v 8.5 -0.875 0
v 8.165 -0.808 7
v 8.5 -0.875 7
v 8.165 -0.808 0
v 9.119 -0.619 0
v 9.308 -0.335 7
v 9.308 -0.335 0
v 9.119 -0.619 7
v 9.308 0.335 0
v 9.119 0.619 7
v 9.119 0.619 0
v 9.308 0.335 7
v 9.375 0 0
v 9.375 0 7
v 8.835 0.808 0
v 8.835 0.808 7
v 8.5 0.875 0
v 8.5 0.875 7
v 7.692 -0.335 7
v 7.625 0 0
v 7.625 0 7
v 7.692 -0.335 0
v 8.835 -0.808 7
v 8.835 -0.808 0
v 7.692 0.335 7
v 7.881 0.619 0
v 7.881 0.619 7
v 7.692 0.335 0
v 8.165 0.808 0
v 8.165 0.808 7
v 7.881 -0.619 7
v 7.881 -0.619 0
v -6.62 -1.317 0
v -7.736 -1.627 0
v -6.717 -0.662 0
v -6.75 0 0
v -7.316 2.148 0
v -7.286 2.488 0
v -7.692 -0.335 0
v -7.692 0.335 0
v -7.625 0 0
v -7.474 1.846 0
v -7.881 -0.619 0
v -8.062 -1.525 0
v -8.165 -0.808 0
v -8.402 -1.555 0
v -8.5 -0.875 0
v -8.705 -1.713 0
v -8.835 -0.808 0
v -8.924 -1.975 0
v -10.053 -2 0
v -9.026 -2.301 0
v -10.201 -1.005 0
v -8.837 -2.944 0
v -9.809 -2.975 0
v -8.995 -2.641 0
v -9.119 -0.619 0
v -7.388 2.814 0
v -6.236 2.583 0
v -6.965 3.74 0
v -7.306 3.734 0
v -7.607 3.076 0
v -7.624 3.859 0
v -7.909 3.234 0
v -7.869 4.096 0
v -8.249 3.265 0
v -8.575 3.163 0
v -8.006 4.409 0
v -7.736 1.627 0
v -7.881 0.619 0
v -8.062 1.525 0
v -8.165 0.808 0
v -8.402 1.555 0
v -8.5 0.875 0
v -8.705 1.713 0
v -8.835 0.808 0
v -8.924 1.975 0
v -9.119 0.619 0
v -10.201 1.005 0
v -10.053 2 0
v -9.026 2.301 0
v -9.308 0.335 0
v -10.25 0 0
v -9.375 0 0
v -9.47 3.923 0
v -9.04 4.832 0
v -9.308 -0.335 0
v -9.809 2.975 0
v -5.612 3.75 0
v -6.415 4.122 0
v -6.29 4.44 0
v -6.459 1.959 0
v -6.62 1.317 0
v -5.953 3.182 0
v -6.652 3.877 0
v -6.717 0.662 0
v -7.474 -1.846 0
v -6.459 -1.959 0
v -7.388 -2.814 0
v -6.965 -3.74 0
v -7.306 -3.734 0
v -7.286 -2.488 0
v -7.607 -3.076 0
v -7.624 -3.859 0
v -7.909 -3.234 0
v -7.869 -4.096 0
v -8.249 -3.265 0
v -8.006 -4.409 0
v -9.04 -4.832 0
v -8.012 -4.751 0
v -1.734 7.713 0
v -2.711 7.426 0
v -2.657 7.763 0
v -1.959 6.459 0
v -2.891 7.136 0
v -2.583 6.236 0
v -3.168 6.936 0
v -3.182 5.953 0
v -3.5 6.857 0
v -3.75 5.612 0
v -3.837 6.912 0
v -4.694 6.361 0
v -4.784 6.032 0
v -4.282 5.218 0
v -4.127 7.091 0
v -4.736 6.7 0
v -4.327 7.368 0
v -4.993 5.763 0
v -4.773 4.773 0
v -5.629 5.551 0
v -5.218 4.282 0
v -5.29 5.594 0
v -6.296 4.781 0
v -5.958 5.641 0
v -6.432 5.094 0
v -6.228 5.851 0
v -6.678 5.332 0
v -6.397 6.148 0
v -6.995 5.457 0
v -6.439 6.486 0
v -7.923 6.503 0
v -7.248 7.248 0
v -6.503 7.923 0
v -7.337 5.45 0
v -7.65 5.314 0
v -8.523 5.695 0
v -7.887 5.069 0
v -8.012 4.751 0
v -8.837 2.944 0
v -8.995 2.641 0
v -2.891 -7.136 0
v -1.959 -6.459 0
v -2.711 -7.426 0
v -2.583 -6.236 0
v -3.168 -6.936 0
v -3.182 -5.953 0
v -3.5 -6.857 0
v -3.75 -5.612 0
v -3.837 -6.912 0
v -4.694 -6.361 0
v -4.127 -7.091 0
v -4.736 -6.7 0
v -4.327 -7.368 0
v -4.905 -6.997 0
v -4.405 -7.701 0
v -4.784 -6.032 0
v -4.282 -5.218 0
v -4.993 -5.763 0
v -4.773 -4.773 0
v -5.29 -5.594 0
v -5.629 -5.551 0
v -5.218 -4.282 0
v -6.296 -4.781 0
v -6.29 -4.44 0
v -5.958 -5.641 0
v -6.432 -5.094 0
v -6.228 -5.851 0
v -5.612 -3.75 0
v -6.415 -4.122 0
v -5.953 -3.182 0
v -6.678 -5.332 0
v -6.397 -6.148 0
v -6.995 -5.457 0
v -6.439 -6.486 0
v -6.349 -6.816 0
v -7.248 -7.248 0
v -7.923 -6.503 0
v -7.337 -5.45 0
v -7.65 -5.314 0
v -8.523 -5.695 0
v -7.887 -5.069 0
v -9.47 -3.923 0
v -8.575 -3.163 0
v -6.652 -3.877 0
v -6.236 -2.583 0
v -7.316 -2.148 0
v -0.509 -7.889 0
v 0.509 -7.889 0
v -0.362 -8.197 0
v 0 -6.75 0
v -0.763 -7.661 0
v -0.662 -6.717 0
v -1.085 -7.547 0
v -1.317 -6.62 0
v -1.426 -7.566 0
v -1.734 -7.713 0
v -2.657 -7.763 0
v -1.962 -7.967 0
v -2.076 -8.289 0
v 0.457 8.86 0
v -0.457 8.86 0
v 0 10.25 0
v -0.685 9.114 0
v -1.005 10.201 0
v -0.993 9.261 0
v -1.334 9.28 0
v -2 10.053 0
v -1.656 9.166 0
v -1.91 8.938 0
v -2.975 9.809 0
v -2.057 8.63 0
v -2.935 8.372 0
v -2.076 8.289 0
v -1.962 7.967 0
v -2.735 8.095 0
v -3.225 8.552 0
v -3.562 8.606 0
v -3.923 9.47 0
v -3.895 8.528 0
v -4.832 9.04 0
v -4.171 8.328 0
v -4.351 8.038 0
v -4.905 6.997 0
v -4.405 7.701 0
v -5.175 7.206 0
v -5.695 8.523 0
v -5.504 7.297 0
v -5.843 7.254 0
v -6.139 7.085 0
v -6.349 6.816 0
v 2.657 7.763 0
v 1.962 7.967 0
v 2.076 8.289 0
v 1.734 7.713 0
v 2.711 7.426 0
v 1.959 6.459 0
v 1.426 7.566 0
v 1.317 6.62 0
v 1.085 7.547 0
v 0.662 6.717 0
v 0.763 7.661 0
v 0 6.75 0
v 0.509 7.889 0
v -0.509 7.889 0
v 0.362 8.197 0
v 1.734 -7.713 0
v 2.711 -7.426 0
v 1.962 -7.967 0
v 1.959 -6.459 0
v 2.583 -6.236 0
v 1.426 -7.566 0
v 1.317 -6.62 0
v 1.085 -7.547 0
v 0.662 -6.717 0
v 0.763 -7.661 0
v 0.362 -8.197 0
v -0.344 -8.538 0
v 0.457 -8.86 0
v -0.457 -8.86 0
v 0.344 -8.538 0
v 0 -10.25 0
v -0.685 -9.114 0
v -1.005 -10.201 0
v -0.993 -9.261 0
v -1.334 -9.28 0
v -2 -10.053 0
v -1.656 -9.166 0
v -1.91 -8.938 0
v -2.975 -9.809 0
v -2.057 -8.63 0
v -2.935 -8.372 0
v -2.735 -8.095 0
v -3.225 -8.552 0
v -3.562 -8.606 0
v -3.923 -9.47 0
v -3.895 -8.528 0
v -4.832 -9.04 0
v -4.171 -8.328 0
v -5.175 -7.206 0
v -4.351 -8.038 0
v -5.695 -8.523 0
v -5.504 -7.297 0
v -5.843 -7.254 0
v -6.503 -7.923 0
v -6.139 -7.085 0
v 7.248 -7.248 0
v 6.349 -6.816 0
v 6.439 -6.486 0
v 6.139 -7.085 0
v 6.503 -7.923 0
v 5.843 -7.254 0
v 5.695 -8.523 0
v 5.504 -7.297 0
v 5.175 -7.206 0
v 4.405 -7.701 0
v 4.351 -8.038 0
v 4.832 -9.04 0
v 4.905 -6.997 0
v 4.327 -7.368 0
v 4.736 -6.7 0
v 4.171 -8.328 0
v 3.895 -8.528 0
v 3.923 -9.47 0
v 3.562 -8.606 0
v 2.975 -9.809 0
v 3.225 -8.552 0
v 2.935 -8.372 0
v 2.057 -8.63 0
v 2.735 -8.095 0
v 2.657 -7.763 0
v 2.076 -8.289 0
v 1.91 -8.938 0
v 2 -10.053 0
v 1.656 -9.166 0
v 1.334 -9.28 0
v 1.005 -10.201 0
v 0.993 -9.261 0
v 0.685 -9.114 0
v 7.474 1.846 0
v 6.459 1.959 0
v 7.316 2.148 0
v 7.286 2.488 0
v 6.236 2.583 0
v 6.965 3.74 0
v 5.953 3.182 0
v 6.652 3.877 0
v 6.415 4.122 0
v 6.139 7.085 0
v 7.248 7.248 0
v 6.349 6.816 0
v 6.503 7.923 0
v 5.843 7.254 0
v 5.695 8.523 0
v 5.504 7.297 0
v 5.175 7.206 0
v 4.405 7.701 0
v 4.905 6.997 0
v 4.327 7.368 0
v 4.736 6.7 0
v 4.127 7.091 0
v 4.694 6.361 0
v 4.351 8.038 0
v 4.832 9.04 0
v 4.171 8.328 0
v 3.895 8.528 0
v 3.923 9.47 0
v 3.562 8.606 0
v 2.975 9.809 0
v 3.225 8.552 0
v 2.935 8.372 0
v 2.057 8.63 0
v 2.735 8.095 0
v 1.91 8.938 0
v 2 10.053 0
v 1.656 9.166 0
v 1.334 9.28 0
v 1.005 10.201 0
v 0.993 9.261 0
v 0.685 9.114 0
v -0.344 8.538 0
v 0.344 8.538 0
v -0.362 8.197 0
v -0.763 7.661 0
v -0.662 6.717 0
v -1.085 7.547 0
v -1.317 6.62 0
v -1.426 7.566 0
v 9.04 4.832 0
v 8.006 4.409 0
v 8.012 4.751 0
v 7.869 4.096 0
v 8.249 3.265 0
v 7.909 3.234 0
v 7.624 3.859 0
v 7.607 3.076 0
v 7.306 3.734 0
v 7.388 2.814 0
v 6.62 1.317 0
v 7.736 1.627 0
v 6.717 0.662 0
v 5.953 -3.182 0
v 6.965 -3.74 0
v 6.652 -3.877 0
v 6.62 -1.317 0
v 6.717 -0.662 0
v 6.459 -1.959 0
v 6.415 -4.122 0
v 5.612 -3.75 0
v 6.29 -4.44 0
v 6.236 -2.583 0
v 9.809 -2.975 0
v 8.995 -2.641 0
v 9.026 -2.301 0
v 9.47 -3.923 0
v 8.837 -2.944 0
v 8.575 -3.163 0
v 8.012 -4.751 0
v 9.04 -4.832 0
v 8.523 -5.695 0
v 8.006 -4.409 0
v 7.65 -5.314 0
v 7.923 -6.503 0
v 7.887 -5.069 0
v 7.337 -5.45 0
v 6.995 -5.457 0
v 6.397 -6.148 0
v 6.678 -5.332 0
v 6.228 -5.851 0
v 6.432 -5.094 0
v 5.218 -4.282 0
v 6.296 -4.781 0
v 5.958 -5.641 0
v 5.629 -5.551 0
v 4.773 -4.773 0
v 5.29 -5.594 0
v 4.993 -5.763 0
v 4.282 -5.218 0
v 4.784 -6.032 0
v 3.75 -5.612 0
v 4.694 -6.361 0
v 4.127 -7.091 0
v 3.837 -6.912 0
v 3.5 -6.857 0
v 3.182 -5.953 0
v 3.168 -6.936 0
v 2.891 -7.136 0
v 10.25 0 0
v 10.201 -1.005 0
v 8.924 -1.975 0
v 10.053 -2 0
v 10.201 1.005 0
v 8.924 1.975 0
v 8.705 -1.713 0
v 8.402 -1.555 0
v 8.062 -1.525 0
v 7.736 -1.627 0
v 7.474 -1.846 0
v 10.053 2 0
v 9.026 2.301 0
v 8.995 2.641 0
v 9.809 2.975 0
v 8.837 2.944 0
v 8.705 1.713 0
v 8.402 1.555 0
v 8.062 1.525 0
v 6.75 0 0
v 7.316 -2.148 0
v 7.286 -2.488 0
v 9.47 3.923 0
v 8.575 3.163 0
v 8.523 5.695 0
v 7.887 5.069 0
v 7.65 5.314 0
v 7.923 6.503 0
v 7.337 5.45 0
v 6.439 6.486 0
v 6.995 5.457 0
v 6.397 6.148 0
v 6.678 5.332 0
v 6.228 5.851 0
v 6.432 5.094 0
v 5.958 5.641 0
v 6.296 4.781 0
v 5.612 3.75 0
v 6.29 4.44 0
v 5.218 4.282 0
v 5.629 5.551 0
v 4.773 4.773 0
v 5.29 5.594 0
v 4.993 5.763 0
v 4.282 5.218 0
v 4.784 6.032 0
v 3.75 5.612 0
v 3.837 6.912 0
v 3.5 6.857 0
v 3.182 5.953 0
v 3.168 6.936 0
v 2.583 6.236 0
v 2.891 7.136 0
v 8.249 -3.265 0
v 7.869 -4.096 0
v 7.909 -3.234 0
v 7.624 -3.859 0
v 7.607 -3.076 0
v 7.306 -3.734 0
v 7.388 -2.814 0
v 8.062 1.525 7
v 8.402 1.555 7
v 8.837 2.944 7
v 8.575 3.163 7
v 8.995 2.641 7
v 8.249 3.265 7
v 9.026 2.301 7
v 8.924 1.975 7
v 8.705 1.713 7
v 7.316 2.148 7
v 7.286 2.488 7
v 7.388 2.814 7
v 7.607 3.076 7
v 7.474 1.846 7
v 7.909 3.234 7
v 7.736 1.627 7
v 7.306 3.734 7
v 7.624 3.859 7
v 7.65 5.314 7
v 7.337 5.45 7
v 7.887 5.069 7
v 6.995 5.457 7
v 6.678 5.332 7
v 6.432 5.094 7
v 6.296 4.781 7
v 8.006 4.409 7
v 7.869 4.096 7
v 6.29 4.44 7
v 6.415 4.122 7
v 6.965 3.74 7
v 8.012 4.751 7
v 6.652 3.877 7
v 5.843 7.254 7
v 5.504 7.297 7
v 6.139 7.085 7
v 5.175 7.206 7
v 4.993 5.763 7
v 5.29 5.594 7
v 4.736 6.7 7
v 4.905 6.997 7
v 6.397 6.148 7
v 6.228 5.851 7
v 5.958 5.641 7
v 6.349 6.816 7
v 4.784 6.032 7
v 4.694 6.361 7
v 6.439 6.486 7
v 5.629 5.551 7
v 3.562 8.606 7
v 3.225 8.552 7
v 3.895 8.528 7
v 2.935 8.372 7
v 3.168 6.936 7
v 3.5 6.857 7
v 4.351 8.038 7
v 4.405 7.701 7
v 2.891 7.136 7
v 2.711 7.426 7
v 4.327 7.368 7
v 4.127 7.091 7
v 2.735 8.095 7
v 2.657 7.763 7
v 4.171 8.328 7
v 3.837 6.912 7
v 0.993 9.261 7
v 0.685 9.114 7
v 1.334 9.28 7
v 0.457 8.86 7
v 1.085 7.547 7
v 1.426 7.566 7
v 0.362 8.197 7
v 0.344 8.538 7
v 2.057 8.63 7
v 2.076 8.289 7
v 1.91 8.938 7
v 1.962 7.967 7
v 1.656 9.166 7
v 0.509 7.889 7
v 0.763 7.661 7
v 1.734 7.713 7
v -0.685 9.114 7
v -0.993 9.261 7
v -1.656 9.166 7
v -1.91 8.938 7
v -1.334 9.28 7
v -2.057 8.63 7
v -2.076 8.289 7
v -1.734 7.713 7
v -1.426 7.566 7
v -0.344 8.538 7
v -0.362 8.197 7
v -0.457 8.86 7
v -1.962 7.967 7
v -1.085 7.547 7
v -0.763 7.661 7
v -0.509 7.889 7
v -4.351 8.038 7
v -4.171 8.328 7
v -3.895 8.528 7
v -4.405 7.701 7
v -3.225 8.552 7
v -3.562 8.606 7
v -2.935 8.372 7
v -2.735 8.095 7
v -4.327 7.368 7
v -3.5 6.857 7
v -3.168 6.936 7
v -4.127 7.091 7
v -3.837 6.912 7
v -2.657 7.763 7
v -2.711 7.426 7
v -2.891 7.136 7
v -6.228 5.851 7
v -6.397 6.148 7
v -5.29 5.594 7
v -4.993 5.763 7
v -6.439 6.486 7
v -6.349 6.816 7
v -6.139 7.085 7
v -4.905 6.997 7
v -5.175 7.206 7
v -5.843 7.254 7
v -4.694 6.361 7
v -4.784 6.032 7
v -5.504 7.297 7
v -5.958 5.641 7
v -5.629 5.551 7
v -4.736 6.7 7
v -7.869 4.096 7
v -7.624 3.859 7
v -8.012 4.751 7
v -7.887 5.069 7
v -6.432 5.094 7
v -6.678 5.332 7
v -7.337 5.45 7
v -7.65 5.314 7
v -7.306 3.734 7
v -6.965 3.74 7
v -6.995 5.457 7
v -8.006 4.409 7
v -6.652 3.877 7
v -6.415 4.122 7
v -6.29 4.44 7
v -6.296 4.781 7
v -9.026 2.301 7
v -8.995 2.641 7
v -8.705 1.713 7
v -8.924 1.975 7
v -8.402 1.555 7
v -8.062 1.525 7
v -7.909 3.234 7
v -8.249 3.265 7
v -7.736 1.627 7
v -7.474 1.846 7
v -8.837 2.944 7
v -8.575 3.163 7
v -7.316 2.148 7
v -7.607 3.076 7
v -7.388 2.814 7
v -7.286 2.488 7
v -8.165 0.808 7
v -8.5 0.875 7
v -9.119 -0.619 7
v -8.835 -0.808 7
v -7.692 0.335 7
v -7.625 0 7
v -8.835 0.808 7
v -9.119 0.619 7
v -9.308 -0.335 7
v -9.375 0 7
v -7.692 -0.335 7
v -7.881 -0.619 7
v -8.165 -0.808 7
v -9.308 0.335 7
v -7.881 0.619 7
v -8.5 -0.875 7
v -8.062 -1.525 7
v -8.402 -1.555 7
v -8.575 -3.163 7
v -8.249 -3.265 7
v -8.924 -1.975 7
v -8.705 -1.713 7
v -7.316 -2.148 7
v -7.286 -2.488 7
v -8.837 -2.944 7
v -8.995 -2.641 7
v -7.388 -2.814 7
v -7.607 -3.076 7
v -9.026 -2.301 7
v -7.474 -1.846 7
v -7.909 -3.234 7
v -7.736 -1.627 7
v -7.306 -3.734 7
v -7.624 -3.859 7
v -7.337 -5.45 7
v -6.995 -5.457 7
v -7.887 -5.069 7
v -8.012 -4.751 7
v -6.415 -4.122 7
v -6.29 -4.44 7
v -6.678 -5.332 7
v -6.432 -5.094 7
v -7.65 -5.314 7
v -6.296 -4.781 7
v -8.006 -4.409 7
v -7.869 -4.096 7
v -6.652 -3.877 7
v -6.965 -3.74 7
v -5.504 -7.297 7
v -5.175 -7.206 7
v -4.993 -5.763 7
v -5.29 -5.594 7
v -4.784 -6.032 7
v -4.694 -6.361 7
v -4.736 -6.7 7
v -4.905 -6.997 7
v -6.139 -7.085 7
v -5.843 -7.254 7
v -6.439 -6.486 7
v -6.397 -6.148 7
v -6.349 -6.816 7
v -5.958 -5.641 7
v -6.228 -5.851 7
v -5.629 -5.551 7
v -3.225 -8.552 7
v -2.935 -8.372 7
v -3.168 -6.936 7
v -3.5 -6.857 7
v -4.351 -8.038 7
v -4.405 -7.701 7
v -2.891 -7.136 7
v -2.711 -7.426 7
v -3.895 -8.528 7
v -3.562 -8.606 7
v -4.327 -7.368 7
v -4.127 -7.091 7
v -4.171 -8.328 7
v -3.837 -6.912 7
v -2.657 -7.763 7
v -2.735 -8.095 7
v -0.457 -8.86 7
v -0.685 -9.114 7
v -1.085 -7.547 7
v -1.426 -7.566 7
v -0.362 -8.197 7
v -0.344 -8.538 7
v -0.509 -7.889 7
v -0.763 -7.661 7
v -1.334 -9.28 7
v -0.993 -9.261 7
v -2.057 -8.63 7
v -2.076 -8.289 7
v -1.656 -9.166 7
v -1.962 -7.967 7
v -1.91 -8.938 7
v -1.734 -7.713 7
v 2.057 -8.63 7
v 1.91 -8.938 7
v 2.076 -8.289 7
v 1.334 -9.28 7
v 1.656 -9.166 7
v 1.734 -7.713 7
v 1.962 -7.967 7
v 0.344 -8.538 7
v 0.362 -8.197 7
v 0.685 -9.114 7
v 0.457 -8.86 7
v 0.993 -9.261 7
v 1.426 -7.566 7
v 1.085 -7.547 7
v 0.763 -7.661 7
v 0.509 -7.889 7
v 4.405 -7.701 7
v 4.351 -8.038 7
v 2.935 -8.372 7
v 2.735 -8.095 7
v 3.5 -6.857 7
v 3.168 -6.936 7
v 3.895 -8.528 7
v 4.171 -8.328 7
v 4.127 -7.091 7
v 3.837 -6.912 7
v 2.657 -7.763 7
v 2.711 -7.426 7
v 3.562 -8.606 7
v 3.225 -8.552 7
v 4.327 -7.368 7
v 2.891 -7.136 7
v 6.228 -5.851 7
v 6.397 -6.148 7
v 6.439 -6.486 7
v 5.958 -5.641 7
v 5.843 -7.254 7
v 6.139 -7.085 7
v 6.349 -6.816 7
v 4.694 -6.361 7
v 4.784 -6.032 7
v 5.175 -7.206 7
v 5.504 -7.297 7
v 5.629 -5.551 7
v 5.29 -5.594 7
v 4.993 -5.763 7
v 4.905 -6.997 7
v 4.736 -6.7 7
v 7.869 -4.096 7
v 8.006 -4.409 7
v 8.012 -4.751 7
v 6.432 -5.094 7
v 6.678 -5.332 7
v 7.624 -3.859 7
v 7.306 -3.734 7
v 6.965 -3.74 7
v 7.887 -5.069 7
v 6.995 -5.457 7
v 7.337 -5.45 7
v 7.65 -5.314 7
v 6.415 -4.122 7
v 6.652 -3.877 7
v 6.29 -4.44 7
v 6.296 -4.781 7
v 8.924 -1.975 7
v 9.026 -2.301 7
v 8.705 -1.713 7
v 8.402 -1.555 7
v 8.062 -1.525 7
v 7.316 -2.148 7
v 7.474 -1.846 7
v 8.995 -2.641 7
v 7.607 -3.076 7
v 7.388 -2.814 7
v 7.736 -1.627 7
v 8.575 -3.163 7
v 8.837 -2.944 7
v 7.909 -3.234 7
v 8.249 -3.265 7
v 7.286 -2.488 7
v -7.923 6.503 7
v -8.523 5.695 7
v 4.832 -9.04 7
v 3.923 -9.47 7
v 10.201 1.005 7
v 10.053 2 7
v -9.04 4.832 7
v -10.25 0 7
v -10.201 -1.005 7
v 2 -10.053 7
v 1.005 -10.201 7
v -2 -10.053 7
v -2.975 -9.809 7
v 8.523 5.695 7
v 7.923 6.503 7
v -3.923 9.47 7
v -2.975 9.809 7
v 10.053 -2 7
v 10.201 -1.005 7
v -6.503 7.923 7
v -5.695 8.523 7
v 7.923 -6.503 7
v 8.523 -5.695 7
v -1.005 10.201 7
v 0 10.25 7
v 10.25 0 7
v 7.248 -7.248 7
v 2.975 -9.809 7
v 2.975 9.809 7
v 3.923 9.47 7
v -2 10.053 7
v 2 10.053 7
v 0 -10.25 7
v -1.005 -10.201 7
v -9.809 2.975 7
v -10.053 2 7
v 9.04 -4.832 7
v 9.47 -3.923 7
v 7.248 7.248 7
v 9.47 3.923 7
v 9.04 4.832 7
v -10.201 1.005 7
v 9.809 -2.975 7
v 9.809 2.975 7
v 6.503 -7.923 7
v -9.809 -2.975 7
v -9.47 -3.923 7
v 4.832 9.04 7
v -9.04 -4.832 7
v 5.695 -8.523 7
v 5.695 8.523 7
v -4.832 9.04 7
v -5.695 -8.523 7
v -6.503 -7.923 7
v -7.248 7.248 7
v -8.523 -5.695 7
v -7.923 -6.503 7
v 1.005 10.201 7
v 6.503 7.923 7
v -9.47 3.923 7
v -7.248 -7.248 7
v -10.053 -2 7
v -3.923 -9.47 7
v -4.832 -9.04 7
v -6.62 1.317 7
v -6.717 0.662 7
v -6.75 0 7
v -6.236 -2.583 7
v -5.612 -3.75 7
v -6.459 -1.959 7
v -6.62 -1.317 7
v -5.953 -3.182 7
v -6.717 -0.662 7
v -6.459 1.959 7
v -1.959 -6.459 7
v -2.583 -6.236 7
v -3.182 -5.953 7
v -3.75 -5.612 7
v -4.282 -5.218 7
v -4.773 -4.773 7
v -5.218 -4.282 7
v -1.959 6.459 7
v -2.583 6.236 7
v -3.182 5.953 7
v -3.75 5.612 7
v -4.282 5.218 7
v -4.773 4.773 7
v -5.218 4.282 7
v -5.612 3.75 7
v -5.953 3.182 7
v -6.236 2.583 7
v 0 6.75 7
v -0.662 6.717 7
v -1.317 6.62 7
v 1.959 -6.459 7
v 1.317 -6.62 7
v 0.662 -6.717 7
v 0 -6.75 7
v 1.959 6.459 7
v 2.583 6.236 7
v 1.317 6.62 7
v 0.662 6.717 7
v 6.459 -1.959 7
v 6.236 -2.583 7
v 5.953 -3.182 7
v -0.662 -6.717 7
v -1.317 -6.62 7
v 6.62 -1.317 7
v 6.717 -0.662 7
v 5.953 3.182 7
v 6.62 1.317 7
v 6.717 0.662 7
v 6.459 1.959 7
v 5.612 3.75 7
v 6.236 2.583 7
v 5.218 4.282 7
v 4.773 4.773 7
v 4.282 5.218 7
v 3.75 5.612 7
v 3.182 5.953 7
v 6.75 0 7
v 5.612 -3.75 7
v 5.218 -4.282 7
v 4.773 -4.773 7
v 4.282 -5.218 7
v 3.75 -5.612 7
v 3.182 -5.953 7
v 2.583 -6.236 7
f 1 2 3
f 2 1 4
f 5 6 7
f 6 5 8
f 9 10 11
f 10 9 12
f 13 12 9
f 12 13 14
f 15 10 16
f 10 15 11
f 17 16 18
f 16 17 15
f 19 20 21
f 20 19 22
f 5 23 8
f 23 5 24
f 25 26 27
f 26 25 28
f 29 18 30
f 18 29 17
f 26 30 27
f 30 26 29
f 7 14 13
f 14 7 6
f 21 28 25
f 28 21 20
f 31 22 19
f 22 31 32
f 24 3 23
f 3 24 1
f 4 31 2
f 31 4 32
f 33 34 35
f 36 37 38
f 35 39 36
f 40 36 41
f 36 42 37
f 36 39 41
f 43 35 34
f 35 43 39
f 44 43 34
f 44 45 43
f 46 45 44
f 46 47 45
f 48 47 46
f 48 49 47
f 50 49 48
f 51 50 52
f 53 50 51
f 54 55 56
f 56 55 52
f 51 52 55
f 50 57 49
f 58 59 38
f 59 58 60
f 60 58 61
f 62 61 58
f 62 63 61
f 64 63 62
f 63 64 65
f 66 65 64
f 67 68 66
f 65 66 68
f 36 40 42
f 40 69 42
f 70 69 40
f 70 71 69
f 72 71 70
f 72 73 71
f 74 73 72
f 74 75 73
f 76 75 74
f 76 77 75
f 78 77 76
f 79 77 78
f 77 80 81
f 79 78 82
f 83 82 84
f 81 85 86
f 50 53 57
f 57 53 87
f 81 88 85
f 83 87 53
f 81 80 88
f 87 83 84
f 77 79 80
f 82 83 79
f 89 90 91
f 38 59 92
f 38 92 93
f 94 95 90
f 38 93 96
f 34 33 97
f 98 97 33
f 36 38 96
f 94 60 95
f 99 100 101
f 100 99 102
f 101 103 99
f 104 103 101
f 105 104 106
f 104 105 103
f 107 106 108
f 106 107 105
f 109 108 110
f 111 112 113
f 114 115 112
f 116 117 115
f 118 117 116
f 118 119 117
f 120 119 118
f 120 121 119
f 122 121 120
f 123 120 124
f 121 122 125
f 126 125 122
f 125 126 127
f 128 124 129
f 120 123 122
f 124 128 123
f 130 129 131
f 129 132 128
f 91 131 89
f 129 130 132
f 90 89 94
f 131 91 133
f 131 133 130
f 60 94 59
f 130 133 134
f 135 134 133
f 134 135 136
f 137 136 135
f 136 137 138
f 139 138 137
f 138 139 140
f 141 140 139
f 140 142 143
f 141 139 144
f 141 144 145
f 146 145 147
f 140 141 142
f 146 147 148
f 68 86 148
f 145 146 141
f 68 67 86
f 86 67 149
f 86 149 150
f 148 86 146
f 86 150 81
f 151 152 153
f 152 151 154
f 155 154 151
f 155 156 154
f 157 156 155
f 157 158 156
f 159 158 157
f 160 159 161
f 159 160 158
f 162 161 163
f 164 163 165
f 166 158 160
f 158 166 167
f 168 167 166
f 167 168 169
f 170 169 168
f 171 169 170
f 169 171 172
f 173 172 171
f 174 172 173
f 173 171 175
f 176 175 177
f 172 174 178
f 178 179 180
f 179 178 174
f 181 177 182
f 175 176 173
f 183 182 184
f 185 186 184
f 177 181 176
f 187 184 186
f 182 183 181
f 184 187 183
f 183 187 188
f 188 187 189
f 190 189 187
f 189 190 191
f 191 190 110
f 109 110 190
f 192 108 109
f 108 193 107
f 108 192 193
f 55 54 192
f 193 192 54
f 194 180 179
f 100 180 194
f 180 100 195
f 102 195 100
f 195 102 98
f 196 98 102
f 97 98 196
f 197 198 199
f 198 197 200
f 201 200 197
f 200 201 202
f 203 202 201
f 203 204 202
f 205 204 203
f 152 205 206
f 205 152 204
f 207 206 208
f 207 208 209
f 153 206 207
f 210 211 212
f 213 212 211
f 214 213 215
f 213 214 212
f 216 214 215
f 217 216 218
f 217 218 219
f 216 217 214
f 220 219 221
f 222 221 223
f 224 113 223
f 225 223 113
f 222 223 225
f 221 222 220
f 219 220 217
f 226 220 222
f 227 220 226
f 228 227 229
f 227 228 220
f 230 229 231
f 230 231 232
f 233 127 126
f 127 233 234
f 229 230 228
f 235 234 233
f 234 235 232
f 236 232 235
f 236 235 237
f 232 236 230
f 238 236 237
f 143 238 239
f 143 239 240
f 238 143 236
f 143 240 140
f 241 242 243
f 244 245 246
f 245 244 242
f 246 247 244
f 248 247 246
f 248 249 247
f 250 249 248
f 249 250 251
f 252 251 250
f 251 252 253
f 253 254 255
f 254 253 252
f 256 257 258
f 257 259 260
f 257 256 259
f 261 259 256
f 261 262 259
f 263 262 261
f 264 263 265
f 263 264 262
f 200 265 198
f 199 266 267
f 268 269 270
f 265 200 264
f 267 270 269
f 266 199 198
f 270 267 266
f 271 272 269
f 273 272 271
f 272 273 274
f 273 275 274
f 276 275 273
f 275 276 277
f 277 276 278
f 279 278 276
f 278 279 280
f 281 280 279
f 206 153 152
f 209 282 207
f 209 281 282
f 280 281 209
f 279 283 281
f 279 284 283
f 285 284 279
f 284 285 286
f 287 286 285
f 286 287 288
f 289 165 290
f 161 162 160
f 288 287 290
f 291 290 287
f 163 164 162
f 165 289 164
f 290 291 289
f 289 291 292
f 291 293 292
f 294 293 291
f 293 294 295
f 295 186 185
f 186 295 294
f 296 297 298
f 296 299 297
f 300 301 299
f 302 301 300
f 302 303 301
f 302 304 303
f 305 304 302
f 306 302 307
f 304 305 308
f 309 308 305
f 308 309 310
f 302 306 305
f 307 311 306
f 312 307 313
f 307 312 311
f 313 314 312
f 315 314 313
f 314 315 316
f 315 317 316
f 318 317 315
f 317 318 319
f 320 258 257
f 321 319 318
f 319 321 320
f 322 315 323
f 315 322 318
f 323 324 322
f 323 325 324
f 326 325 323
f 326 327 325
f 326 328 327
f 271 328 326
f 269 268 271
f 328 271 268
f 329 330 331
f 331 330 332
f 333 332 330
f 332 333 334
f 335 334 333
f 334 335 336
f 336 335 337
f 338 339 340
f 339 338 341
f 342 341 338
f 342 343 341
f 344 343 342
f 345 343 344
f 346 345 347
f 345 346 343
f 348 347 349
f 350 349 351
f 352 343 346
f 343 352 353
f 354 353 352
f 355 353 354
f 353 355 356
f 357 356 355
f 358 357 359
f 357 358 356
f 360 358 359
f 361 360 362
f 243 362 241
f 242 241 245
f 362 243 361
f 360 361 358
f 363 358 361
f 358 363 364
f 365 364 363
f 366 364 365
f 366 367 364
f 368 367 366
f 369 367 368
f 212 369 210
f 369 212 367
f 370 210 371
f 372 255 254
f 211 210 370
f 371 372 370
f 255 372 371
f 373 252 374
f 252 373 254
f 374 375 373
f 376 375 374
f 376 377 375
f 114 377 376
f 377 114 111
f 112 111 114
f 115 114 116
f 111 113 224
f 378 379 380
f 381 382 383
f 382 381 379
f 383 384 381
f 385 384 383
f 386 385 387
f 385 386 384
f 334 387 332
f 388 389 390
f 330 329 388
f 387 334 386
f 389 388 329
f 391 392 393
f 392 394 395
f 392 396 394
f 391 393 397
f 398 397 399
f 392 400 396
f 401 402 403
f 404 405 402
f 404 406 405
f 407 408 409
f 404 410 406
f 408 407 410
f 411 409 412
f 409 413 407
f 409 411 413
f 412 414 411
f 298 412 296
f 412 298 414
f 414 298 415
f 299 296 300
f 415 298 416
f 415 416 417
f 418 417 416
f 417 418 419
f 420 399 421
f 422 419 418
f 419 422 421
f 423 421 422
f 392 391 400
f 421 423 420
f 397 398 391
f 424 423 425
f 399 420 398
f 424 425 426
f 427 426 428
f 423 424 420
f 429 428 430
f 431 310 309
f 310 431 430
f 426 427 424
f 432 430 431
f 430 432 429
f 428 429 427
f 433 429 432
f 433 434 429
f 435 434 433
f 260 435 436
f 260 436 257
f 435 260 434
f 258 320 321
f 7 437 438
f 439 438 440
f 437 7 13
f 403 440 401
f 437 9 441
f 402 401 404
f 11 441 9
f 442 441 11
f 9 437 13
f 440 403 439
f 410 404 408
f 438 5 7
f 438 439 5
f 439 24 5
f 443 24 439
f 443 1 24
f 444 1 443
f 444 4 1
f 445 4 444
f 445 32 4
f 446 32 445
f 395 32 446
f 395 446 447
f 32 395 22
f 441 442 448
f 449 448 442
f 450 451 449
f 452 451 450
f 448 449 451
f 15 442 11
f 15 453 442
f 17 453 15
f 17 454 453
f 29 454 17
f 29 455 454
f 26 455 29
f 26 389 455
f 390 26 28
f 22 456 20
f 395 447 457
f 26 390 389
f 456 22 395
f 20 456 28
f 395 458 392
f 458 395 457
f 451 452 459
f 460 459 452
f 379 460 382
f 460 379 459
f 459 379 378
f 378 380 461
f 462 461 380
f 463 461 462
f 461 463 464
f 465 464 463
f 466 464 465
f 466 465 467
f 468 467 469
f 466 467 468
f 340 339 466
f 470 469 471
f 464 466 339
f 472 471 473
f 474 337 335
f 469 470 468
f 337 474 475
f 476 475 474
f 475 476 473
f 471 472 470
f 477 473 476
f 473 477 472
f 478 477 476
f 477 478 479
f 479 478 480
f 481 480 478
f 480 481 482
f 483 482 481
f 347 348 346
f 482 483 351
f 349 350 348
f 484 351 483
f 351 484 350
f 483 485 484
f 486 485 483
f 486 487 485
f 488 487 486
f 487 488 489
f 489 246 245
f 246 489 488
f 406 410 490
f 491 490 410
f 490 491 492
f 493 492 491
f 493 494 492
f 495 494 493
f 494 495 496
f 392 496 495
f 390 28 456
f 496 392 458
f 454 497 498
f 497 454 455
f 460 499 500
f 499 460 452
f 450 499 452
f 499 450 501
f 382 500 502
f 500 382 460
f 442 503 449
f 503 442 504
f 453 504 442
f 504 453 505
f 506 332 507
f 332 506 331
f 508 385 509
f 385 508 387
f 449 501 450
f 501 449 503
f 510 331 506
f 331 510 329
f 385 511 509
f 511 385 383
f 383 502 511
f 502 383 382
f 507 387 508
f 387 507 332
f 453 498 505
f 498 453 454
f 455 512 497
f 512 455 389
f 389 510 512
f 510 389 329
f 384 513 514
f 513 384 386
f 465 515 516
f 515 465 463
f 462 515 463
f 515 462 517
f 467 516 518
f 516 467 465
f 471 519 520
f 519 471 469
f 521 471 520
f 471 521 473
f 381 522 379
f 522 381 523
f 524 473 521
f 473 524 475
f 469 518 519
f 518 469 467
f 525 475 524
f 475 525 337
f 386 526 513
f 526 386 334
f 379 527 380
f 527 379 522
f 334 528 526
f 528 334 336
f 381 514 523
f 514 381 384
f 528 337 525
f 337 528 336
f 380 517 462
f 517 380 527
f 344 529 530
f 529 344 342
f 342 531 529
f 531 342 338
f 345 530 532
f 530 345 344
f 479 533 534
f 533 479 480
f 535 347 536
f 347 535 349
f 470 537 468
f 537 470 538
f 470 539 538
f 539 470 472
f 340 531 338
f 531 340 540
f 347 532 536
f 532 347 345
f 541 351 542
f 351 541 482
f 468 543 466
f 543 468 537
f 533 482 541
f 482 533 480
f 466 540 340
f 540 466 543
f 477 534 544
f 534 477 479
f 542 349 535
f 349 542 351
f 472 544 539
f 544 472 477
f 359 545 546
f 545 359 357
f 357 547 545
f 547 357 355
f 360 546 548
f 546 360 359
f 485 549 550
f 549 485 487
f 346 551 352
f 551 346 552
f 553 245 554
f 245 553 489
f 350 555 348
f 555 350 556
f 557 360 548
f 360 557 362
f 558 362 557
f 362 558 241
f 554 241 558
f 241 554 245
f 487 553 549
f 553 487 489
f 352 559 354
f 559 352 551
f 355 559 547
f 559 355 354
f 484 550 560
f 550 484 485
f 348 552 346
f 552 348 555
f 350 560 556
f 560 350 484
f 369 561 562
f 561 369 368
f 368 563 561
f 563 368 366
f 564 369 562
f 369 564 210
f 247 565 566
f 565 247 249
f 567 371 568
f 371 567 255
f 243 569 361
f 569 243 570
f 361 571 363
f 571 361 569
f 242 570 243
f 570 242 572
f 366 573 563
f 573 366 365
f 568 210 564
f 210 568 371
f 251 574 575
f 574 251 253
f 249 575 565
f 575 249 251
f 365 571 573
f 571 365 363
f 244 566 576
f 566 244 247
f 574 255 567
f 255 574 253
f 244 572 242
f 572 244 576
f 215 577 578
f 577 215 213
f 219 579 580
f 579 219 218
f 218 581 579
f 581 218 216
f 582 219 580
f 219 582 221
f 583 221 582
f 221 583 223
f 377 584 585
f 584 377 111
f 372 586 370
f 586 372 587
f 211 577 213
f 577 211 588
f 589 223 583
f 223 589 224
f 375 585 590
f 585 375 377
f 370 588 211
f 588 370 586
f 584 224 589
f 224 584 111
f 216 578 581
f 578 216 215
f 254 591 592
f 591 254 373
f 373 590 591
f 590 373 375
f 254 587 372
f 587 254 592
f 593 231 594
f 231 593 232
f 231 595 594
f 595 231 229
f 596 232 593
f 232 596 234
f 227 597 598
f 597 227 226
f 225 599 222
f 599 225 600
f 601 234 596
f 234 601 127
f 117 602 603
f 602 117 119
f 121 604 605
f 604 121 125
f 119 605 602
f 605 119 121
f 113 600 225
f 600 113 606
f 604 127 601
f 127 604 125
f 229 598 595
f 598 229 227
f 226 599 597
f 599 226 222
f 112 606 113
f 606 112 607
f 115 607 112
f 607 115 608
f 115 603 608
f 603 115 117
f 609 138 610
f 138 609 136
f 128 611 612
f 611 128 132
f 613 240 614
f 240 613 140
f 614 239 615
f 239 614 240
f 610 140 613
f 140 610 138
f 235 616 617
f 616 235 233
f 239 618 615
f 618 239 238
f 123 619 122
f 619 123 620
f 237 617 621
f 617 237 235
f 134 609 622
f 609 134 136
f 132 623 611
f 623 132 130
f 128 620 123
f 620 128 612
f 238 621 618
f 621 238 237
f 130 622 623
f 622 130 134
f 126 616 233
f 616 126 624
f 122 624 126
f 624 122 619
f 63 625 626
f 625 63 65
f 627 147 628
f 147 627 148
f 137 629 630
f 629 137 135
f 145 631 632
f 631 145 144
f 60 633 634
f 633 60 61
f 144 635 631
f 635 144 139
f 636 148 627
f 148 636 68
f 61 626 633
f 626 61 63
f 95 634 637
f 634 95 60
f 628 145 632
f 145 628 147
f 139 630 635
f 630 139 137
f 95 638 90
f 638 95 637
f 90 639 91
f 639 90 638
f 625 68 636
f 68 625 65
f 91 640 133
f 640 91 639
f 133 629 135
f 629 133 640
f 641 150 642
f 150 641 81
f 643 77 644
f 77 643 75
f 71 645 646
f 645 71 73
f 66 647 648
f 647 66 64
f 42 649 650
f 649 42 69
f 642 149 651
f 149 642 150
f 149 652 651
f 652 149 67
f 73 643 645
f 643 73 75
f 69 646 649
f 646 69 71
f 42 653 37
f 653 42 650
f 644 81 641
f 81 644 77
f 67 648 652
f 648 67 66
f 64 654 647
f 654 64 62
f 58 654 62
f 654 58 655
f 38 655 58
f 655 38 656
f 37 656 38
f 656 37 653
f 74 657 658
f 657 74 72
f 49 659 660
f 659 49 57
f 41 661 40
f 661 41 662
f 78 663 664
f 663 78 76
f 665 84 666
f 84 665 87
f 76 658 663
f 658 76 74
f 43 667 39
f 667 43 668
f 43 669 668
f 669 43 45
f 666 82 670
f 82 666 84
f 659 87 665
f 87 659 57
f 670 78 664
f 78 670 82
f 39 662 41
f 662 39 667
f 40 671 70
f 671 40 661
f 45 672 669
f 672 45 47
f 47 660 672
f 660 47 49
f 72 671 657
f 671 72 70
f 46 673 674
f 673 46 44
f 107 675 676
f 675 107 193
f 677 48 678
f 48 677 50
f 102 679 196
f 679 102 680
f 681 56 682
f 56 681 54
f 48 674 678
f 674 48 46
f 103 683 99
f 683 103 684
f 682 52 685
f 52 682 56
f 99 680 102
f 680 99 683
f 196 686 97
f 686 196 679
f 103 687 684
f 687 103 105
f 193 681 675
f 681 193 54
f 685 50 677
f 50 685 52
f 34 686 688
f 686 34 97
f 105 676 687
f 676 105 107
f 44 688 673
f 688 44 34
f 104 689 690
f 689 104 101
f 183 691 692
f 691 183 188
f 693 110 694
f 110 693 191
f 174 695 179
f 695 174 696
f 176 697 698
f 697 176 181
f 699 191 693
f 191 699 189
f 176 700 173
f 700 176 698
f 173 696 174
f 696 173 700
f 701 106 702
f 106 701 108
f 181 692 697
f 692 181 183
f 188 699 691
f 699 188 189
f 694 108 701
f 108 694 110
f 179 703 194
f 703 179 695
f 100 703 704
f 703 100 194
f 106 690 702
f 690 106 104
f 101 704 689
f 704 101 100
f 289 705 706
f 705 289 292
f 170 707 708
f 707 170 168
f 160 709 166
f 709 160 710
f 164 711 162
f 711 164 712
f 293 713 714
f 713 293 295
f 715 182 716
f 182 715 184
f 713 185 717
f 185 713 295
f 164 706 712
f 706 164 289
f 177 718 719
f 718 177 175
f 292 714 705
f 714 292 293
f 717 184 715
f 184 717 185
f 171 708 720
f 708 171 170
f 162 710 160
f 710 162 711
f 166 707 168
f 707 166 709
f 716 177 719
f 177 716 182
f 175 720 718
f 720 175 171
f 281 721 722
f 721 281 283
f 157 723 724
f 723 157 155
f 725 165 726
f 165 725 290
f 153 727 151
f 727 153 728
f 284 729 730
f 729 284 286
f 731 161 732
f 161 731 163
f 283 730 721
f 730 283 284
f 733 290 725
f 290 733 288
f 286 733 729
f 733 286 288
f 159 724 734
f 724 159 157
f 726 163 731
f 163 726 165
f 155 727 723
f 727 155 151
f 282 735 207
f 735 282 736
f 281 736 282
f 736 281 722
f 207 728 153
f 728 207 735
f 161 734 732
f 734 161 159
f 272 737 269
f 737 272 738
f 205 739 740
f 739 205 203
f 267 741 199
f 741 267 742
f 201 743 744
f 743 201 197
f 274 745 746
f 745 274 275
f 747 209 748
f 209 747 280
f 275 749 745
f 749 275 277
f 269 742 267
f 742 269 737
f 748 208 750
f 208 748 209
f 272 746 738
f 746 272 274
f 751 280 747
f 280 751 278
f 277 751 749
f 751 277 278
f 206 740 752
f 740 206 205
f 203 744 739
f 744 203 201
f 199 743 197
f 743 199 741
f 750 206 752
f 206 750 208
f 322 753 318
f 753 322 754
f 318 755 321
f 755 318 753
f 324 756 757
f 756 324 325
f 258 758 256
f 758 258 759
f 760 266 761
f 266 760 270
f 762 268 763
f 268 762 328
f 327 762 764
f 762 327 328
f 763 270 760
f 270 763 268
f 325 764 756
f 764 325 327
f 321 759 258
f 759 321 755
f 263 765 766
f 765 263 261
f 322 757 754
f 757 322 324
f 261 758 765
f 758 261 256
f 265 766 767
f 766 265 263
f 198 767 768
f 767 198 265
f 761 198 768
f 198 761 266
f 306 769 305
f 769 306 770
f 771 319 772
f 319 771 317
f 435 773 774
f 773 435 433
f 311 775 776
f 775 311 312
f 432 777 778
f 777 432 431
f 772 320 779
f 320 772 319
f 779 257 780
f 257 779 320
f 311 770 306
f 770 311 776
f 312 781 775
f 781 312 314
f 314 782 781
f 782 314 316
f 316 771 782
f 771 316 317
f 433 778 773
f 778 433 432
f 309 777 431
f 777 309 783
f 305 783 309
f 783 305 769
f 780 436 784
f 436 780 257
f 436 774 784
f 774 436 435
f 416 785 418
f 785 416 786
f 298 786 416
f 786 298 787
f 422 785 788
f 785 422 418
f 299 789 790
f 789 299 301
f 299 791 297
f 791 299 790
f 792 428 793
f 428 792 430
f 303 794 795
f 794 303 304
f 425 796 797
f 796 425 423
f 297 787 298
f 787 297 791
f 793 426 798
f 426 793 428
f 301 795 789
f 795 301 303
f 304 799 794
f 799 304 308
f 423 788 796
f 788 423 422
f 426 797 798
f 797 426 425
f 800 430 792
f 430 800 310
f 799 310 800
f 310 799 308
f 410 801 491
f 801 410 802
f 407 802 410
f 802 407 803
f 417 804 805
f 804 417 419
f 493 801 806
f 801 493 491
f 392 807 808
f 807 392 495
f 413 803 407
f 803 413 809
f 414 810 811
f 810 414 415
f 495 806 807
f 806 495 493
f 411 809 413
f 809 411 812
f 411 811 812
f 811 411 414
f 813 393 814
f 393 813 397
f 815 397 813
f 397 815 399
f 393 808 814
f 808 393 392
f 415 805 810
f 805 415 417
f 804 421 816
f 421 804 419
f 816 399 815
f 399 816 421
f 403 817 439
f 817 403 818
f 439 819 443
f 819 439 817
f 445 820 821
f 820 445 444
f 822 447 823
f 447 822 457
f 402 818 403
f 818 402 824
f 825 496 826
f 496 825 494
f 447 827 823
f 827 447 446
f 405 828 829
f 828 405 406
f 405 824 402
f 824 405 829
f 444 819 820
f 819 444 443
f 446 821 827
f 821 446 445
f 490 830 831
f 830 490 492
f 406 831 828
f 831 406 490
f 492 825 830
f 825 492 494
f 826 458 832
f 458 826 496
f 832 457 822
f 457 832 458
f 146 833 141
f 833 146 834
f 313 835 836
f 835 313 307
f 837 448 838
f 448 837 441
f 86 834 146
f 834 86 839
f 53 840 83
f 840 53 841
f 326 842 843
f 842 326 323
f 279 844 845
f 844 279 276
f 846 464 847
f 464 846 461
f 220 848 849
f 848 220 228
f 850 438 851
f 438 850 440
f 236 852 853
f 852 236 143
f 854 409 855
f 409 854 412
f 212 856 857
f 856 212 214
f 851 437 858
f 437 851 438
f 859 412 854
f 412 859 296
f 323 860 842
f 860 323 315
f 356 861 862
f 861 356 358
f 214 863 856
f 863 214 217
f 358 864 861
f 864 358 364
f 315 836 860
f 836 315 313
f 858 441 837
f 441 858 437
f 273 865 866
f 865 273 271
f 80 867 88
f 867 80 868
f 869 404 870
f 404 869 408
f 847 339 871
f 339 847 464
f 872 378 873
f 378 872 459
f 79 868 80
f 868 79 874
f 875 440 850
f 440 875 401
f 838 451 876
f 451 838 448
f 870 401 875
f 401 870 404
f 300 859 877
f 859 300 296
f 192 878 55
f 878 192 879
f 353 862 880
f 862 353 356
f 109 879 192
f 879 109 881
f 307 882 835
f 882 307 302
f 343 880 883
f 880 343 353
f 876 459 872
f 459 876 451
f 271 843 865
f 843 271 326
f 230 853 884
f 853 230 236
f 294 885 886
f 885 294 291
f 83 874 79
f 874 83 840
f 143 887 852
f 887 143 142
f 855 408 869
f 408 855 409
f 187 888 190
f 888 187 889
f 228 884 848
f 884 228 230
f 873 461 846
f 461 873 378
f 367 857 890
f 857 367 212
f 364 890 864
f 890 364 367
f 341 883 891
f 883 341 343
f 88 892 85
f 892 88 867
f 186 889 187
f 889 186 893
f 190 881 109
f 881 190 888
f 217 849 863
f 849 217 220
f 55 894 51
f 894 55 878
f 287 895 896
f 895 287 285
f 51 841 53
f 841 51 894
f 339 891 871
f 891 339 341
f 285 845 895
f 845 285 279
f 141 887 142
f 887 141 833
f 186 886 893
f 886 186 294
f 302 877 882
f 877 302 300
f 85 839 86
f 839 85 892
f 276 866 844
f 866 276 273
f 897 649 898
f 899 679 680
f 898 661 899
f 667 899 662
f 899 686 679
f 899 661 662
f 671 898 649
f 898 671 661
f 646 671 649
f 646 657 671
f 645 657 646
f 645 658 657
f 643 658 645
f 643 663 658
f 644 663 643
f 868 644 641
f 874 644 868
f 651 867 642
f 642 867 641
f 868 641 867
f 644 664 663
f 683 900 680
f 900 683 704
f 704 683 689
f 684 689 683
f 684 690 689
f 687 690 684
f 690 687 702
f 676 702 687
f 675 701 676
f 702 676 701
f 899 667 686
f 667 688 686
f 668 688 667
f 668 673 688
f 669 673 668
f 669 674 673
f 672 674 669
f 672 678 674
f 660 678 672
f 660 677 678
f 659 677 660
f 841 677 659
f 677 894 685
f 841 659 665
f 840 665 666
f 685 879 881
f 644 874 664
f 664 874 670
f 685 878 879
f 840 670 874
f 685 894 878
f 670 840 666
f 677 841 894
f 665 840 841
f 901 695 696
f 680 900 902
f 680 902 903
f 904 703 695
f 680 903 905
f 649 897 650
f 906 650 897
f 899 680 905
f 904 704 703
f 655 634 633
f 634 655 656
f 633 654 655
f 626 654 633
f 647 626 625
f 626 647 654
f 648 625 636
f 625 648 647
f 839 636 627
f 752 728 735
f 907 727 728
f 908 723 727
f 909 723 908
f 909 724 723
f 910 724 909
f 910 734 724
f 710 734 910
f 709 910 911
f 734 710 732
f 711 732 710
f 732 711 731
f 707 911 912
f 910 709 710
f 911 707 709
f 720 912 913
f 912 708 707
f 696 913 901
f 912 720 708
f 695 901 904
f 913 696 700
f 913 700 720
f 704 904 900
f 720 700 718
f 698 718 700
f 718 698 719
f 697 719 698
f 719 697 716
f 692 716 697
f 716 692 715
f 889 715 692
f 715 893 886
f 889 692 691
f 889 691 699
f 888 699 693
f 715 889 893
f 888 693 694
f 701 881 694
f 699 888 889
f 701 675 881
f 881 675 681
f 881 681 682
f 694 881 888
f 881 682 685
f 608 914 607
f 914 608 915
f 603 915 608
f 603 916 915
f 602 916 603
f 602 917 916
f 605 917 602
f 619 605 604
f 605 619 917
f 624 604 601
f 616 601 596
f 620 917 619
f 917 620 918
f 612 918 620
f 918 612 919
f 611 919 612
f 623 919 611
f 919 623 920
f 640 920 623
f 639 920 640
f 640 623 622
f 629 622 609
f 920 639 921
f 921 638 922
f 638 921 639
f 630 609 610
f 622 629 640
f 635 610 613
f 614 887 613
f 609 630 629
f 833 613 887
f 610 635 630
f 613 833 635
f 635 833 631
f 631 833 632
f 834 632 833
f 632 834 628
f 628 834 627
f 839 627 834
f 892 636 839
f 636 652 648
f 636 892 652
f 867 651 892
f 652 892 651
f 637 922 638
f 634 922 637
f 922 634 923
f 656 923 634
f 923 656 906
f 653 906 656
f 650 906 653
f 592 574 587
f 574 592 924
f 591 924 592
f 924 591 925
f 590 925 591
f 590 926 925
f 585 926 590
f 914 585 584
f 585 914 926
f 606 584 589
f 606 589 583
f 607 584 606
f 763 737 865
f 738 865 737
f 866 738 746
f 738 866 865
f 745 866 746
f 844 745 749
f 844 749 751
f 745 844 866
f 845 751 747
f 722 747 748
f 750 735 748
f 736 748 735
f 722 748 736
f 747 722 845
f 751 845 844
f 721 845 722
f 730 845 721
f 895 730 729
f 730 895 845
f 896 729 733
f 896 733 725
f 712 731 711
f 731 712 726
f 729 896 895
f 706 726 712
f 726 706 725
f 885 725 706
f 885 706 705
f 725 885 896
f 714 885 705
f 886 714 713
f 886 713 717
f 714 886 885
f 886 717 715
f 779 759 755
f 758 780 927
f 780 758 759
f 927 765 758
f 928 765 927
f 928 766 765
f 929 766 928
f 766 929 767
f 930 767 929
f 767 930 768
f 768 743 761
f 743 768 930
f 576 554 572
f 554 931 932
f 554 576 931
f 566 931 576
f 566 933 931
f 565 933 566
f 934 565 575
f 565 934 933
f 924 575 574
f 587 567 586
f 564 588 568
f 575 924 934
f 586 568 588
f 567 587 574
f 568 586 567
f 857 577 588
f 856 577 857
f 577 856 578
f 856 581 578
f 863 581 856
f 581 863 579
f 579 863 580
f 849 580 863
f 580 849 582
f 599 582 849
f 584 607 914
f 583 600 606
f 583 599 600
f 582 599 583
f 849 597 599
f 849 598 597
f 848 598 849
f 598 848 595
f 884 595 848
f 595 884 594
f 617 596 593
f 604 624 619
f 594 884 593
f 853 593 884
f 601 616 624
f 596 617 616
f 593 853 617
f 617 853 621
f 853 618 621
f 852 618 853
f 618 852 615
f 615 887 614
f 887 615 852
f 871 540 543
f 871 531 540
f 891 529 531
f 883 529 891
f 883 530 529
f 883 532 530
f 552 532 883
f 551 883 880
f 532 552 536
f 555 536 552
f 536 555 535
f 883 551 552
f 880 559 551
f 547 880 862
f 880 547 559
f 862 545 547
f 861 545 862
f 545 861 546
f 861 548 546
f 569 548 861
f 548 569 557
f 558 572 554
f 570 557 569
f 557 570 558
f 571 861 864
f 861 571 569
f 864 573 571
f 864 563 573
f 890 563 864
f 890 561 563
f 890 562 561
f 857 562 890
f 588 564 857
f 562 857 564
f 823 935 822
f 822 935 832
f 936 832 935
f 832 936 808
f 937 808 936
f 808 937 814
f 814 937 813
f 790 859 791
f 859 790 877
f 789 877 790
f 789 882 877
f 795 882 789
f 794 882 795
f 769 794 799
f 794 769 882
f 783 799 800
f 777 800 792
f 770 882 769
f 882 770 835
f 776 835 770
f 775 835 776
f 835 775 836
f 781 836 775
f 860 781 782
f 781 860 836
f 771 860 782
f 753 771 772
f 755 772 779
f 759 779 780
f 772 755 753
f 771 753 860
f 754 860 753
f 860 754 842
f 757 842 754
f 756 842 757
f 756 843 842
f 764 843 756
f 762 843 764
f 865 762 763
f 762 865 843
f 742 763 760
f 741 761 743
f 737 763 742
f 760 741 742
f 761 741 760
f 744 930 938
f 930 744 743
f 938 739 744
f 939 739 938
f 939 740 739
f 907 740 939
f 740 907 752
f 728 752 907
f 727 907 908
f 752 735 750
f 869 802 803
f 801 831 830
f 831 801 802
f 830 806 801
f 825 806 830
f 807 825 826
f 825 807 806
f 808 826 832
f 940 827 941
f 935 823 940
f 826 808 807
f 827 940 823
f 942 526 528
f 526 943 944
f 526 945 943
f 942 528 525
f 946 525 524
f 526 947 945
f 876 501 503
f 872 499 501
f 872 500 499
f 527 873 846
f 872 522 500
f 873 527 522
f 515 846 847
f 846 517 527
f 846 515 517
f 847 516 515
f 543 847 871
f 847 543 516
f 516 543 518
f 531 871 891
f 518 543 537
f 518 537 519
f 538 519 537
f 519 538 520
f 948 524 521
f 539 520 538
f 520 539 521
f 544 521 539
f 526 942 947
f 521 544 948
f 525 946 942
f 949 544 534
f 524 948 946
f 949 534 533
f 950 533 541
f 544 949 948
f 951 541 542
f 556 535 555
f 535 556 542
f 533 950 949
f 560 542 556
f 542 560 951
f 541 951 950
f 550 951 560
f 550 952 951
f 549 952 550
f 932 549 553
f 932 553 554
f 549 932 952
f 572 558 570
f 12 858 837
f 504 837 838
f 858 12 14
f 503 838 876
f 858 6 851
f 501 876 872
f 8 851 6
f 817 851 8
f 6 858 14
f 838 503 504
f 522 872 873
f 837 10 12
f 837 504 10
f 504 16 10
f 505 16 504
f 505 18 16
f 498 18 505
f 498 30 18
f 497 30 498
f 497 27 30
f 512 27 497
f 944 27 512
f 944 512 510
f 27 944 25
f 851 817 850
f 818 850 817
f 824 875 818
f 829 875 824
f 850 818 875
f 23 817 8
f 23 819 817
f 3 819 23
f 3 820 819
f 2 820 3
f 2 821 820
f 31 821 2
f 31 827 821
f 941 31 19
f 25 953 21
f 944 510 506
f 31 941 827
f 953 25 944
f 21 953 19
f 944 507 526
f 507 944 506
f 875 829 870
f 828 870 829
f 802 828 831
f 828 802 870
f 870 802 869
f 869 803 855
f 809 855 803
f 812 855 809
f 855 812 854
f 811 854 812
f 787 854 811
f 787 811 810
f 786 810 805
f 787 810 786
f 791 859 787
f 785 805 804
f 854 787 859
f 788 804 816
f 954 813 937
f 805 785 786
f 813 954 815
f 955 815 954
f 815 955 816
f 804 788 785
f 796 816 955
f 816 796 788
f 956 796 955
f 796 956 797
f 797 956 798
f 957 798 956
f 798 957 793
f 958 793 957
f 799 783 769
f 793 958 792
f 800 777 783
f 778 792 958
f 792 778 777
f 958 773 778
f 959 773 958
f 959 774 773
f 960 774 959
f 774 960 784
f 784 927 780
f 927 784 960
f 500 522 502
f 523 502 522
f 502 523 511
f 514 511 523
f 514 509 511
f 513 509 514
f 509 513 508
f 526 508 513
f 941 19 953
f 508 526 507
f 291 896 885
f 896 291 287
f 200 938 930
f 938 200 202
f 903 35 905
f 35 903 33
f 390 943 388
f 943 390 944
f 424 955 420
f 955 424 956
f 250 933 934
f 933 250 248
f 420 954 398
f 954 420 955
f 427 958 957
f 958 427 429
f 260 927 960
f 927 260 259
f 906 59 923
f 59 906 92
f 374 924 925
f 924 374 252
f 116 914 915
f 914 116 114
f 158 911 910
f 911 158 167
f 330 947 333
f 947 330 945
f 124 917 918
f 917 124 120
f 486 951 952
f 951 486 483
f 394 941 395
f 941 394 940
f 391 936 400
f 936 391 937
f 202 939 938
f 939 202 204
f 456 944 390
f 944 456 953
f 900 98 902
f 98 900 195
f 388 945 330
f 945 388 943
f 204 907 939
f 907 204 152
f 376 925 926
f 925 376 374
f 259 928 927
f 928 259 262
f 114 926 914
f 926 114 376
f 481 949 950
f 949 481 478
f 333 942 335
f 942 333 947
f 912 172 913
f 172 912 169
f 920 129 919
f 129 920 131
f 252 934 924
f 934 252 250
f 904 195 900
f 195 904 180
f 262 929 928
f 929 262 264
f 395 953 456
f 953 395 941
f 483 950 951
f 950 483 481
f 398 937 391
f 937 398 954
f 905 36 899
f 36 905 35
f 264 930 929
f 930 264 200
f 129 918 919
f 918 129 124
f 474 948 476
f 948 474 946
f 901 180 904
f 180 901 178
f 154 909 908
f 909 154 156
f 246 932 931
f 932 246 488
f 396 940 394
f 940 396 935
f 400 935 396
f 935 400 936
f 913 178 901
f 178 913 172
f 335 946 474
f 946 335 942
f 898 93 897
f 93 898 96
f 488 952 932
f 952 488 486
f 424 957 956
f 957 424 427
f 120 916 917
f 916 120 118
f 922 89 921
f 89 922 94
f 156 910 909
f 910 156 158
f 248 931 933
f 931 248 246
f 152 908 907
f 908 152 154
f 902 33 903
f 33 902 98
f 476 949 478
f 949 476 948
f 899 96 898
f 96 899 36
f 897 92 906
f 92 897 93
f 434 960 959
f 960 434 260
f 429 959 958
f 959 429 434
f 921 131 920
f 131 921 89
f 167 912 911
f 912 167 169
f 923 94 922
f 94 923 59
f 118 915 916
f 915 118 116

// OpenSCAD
pin_ring_diameter=17;
pin_size=1.75;
pin_count=22;
height=7;

difference()
{
cylinder(r=(pin_ring_diameter/2)+(2*(pin_size/2)),h=height,$fn=64);

cylinder(r=(pin_ring_diameter/2)-(2*(pin_size/2)),h=height+1,$fn=64);

for (i=[0:(360/pin_count):360])
{
	rotate([0,0,i])
	translate([(pin_ring_diameter/2),0,0])
	cylinder(r=(pin_size/2),h=height+1, $fn=16);
}

}
